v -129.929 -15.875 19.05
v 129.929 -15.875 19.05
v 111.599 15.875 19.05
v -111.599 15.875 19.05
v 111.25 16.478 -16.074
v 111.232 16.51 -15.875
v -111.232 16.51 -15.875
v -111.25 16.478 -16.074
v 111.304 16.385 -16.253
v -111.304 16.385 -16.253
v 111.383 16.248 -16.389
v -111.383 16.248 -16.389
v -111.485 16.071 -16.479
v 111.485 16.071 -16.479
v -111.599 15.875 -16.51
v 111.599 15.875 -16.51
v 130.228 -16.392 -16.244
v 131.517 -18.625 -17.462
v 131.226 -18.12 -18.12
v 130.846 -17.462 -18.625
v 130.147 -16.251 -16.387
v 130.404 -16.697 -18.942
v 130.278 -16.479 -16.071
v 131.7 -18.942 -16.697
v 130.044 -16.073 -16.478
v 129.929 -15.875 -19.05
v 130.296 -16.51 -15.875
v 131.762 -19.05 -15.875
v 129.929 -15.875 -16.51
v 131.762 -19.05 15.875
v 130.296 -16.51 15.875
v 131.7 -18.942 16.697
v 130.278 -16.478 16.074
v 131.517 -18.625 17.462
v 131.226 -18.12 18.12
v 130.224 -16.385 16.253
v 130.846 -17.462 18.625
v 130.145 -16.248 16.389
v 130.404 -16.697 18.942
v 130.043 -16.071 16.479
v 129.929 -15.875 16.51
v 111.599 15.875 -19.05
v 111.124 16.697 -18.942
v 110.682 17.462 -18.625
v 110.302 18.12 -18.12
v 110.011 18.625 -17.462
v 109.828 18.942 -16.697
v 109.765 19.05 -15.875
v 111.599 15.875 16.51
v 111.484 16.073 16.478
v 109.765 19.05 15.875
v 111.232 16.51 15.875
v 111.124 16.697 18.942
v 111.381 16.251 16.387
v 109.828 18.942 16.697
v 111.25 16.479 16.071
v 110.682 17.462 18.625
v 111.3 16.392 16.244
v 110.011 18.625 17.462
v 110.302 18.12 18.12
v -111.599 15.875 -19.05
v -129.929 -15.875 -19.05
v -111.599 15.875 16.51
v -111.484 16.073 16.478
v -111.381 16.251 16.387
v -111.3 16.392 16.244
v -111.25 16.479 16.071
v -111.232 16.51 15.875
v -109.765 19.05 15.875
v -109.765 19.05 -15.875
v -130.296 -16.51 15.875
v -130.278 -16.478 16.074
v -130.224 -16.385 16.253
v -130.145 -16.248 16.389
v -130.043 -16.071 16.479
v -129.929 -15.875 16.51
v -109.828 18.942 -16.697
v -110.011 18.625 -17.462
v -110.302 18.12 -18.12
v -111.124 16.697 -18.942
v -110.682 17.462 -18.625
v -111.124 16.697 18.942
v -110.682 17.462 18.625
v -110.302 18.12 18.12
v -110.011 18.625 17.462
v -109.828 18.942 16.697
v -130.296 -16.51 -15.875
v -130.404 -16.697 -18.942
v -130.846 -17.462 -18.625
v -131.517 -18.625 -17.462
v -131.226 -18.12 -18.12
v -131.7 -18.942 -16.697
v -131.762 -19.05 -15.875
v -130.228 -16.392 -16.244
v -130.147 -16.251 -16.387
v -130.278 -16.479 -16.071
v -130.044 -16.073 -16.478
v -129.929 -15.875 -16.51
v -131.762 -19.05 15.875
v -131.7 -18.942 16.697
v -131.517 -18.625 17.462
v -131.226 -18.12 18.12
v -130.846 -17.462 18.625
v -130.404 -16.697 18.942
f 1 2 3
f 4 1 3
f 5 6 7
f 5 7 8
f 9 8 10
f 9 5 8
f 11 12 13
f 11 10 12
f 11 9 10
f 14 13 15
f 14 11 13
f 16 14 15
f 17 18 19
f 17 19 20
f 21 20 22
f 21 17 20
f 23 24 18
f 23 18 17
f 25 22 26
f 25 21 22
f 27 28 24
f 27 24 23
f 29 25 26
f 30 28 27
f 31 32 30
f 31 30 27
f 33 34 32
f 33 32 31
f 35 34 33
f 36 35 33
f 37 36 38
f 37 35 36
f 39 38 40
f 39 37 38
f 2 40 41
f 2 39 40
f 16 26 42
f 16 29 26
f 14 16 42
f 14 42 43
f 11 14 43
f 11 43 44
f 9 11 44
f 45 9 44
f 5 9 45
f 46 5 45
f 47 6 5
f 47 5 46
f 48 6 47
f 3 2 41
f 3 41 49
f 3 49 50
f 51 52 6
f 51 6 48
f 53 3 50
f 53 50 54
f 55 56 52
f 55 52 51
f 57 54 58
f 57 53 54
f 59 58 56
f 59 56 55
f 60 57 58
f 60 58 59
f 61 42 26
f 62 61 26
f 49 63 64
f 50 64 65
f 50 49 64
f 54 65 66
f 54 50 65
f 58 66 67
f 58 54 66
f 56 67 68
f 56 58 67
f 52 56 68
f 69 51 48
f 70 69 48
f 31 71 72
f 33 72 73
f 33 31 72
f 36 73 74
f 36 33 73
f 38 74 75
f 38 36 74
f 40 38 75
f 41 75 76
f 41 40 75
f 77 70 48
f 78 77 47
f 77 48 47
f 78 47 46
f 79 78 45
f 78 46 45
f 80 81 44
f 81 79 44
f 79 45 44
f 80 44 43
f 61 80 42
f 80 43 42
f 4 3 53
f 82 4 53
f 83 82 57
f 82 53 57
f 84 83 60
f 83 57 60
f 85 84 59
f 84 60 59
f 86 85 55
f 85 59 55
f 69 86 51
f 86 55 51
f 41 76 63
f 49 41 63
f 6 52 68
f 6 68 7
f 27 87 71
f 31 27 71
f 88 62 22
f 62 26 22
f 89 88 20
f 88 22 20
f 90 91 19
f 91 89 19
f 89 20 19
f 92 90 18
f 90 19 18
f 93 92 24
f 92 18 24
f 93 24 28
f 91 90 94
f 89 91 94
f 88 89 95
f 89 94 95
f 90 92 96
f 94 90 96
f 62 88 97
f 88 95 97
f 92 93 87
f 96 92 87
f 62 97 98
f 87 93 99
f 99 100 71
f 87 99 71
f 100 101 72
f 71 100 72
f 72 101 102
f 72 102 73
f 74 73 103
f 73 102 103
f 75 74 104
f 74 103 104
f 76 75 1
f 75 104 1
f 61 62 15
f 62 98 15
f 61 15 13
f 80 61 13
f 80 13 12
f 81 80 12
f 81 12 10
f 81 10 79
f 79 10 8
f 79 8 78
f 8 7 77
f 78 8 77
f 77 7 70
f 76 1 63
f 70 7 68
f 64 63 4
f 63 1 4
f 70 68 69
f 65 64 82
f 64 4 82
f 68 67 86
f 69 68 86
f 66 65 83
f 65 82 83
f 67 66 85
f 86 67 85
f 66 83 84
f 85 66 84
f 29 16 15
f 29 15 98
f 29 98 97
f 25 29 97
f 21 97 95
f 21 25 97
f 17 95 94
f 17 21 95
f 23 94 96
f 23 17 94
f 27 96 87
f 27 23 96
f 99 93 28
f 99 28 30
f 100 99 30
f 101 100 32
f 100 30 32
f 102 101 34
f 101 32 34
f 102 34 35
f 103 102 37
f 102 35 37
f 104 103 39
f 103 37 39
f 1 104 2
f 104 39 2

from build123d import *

# Parameters (mm, degrees)
EXTRUDE_THIN1_DEPTH     = 131.7625
CUT_EXTRUDE1_DEPTH      = 1
CUT_EXTRUDE1_DEPTH_BACK = 39.1
CUT_EXTRUDE2_DEPTH      = 1
CUT_EXTRUDE2_DEPTH_BACK = 39.1


with BuildPart() as part:
    # Sketch1 → Extrude-Thin1 (new body, symmetric)
    with BuildSketch(Plane(origin=(0, 0, 0), x_dir=(0, 0, -1), z_dir=(1, 0, 0))):
        with BuildLine():
            Line((-15.875, 19.05), (15.875, 19.05))
            ThreePointArc((15.875, 19.05), (18.12006403, 18.12006403), (19.05, 15.875))
            Line((19.05, 15.875), (19.05, -15.875))
            ThreePointArc((19.05, -15.875), (18.12006403, -18.12006403), (15.875, -19.05))
            Line((15.875, -19.05), (-15.875, -19.05))
            ThreePointArc((-15.875, -19.05), (-18.12006403, -18.12006403), (-19.05, -15.875))
            Line((-19.05, -15.875), (-19.05, 15.875))
            ThreePointArc((-19.05, 15.875), (-18.12006403, 18.12006403), (-15.875, 19.05))
        make_face()
        with BuildLine():
            Line((-15.875, 16.51), (15.875, 16.51))
            ThreePointArc((15.875, 16.51), (16.324012806, 16.324012806), (16.51, 15.875))
            Line((16.51, 15.875), (16.51, -15.875))
            ThreePointArc((16.51, -15.875), (16.324012806, -16.324012806), (15.875, -16.51))
            Line((15.875, -16.51), (-15.875, -16.51))
            ThreePointArc((-15.875, -16.51), (-16.324012806, -16.324012806), (-16.51, -15.875))
            Line((-16.51, -15.875), (-16.51, 15.875))
            ThreePointArc((-16.51, 15.875), (-16.324012806, 16.324012806), (-15.875, 16.51))
        make_face(mode=Mode.SUBTRACT)
    extrude(amount=EXTRUDE_THIN1_DEPTH, both=True)

    # Sketch2 → Cut-Extrude1 (cut, two sides)
    with BuildSketch(Plane.XY.offset(19.05)) as cut_extrude1_sk:
        Polygon((-403.027472584, -488.894714829), (-131.7625, -19.05), (-109.765454744, 19.05), (161.49951784, 488.894714829), (-778.189911818, 1031.424659996), (-1342.716902241, 53.635230339), align=None)
    extrude(amount=CUT_EXTRUDE1_DEPTH, mode=Mode.SUBTRACT)
    extrude(cut_extrude1_sk.sketch, amount=-CUT_EXTRUDE1_DEPTH_BACK, mode=Mode.SUBTRACT)

    # Sketch3 → Cut-Extrude2 (cut, two sides)
    with BuildSketch(Plane.XY.offset(19.05)) as cut_extrude2_sk:
        Polygon((403.027472584, -488.894714829), (131.7625, -19.05), (109.765454744, 19.05), (-161.49951784, 488.894714829), (778.189911818, 1031.424659996), (1342.716902241, 53.635230339), align=None)
    extrude(amount=CUT_EXTRUDE2_DEPTH, mode=Mode.SUBTRACT)
    extrude(cut_extrude2_sk.sketch, amount=-CUT_EXTRUDE2_DEPTH_BACK, mode=Mode.SUBTRACT)


solid = part.part
